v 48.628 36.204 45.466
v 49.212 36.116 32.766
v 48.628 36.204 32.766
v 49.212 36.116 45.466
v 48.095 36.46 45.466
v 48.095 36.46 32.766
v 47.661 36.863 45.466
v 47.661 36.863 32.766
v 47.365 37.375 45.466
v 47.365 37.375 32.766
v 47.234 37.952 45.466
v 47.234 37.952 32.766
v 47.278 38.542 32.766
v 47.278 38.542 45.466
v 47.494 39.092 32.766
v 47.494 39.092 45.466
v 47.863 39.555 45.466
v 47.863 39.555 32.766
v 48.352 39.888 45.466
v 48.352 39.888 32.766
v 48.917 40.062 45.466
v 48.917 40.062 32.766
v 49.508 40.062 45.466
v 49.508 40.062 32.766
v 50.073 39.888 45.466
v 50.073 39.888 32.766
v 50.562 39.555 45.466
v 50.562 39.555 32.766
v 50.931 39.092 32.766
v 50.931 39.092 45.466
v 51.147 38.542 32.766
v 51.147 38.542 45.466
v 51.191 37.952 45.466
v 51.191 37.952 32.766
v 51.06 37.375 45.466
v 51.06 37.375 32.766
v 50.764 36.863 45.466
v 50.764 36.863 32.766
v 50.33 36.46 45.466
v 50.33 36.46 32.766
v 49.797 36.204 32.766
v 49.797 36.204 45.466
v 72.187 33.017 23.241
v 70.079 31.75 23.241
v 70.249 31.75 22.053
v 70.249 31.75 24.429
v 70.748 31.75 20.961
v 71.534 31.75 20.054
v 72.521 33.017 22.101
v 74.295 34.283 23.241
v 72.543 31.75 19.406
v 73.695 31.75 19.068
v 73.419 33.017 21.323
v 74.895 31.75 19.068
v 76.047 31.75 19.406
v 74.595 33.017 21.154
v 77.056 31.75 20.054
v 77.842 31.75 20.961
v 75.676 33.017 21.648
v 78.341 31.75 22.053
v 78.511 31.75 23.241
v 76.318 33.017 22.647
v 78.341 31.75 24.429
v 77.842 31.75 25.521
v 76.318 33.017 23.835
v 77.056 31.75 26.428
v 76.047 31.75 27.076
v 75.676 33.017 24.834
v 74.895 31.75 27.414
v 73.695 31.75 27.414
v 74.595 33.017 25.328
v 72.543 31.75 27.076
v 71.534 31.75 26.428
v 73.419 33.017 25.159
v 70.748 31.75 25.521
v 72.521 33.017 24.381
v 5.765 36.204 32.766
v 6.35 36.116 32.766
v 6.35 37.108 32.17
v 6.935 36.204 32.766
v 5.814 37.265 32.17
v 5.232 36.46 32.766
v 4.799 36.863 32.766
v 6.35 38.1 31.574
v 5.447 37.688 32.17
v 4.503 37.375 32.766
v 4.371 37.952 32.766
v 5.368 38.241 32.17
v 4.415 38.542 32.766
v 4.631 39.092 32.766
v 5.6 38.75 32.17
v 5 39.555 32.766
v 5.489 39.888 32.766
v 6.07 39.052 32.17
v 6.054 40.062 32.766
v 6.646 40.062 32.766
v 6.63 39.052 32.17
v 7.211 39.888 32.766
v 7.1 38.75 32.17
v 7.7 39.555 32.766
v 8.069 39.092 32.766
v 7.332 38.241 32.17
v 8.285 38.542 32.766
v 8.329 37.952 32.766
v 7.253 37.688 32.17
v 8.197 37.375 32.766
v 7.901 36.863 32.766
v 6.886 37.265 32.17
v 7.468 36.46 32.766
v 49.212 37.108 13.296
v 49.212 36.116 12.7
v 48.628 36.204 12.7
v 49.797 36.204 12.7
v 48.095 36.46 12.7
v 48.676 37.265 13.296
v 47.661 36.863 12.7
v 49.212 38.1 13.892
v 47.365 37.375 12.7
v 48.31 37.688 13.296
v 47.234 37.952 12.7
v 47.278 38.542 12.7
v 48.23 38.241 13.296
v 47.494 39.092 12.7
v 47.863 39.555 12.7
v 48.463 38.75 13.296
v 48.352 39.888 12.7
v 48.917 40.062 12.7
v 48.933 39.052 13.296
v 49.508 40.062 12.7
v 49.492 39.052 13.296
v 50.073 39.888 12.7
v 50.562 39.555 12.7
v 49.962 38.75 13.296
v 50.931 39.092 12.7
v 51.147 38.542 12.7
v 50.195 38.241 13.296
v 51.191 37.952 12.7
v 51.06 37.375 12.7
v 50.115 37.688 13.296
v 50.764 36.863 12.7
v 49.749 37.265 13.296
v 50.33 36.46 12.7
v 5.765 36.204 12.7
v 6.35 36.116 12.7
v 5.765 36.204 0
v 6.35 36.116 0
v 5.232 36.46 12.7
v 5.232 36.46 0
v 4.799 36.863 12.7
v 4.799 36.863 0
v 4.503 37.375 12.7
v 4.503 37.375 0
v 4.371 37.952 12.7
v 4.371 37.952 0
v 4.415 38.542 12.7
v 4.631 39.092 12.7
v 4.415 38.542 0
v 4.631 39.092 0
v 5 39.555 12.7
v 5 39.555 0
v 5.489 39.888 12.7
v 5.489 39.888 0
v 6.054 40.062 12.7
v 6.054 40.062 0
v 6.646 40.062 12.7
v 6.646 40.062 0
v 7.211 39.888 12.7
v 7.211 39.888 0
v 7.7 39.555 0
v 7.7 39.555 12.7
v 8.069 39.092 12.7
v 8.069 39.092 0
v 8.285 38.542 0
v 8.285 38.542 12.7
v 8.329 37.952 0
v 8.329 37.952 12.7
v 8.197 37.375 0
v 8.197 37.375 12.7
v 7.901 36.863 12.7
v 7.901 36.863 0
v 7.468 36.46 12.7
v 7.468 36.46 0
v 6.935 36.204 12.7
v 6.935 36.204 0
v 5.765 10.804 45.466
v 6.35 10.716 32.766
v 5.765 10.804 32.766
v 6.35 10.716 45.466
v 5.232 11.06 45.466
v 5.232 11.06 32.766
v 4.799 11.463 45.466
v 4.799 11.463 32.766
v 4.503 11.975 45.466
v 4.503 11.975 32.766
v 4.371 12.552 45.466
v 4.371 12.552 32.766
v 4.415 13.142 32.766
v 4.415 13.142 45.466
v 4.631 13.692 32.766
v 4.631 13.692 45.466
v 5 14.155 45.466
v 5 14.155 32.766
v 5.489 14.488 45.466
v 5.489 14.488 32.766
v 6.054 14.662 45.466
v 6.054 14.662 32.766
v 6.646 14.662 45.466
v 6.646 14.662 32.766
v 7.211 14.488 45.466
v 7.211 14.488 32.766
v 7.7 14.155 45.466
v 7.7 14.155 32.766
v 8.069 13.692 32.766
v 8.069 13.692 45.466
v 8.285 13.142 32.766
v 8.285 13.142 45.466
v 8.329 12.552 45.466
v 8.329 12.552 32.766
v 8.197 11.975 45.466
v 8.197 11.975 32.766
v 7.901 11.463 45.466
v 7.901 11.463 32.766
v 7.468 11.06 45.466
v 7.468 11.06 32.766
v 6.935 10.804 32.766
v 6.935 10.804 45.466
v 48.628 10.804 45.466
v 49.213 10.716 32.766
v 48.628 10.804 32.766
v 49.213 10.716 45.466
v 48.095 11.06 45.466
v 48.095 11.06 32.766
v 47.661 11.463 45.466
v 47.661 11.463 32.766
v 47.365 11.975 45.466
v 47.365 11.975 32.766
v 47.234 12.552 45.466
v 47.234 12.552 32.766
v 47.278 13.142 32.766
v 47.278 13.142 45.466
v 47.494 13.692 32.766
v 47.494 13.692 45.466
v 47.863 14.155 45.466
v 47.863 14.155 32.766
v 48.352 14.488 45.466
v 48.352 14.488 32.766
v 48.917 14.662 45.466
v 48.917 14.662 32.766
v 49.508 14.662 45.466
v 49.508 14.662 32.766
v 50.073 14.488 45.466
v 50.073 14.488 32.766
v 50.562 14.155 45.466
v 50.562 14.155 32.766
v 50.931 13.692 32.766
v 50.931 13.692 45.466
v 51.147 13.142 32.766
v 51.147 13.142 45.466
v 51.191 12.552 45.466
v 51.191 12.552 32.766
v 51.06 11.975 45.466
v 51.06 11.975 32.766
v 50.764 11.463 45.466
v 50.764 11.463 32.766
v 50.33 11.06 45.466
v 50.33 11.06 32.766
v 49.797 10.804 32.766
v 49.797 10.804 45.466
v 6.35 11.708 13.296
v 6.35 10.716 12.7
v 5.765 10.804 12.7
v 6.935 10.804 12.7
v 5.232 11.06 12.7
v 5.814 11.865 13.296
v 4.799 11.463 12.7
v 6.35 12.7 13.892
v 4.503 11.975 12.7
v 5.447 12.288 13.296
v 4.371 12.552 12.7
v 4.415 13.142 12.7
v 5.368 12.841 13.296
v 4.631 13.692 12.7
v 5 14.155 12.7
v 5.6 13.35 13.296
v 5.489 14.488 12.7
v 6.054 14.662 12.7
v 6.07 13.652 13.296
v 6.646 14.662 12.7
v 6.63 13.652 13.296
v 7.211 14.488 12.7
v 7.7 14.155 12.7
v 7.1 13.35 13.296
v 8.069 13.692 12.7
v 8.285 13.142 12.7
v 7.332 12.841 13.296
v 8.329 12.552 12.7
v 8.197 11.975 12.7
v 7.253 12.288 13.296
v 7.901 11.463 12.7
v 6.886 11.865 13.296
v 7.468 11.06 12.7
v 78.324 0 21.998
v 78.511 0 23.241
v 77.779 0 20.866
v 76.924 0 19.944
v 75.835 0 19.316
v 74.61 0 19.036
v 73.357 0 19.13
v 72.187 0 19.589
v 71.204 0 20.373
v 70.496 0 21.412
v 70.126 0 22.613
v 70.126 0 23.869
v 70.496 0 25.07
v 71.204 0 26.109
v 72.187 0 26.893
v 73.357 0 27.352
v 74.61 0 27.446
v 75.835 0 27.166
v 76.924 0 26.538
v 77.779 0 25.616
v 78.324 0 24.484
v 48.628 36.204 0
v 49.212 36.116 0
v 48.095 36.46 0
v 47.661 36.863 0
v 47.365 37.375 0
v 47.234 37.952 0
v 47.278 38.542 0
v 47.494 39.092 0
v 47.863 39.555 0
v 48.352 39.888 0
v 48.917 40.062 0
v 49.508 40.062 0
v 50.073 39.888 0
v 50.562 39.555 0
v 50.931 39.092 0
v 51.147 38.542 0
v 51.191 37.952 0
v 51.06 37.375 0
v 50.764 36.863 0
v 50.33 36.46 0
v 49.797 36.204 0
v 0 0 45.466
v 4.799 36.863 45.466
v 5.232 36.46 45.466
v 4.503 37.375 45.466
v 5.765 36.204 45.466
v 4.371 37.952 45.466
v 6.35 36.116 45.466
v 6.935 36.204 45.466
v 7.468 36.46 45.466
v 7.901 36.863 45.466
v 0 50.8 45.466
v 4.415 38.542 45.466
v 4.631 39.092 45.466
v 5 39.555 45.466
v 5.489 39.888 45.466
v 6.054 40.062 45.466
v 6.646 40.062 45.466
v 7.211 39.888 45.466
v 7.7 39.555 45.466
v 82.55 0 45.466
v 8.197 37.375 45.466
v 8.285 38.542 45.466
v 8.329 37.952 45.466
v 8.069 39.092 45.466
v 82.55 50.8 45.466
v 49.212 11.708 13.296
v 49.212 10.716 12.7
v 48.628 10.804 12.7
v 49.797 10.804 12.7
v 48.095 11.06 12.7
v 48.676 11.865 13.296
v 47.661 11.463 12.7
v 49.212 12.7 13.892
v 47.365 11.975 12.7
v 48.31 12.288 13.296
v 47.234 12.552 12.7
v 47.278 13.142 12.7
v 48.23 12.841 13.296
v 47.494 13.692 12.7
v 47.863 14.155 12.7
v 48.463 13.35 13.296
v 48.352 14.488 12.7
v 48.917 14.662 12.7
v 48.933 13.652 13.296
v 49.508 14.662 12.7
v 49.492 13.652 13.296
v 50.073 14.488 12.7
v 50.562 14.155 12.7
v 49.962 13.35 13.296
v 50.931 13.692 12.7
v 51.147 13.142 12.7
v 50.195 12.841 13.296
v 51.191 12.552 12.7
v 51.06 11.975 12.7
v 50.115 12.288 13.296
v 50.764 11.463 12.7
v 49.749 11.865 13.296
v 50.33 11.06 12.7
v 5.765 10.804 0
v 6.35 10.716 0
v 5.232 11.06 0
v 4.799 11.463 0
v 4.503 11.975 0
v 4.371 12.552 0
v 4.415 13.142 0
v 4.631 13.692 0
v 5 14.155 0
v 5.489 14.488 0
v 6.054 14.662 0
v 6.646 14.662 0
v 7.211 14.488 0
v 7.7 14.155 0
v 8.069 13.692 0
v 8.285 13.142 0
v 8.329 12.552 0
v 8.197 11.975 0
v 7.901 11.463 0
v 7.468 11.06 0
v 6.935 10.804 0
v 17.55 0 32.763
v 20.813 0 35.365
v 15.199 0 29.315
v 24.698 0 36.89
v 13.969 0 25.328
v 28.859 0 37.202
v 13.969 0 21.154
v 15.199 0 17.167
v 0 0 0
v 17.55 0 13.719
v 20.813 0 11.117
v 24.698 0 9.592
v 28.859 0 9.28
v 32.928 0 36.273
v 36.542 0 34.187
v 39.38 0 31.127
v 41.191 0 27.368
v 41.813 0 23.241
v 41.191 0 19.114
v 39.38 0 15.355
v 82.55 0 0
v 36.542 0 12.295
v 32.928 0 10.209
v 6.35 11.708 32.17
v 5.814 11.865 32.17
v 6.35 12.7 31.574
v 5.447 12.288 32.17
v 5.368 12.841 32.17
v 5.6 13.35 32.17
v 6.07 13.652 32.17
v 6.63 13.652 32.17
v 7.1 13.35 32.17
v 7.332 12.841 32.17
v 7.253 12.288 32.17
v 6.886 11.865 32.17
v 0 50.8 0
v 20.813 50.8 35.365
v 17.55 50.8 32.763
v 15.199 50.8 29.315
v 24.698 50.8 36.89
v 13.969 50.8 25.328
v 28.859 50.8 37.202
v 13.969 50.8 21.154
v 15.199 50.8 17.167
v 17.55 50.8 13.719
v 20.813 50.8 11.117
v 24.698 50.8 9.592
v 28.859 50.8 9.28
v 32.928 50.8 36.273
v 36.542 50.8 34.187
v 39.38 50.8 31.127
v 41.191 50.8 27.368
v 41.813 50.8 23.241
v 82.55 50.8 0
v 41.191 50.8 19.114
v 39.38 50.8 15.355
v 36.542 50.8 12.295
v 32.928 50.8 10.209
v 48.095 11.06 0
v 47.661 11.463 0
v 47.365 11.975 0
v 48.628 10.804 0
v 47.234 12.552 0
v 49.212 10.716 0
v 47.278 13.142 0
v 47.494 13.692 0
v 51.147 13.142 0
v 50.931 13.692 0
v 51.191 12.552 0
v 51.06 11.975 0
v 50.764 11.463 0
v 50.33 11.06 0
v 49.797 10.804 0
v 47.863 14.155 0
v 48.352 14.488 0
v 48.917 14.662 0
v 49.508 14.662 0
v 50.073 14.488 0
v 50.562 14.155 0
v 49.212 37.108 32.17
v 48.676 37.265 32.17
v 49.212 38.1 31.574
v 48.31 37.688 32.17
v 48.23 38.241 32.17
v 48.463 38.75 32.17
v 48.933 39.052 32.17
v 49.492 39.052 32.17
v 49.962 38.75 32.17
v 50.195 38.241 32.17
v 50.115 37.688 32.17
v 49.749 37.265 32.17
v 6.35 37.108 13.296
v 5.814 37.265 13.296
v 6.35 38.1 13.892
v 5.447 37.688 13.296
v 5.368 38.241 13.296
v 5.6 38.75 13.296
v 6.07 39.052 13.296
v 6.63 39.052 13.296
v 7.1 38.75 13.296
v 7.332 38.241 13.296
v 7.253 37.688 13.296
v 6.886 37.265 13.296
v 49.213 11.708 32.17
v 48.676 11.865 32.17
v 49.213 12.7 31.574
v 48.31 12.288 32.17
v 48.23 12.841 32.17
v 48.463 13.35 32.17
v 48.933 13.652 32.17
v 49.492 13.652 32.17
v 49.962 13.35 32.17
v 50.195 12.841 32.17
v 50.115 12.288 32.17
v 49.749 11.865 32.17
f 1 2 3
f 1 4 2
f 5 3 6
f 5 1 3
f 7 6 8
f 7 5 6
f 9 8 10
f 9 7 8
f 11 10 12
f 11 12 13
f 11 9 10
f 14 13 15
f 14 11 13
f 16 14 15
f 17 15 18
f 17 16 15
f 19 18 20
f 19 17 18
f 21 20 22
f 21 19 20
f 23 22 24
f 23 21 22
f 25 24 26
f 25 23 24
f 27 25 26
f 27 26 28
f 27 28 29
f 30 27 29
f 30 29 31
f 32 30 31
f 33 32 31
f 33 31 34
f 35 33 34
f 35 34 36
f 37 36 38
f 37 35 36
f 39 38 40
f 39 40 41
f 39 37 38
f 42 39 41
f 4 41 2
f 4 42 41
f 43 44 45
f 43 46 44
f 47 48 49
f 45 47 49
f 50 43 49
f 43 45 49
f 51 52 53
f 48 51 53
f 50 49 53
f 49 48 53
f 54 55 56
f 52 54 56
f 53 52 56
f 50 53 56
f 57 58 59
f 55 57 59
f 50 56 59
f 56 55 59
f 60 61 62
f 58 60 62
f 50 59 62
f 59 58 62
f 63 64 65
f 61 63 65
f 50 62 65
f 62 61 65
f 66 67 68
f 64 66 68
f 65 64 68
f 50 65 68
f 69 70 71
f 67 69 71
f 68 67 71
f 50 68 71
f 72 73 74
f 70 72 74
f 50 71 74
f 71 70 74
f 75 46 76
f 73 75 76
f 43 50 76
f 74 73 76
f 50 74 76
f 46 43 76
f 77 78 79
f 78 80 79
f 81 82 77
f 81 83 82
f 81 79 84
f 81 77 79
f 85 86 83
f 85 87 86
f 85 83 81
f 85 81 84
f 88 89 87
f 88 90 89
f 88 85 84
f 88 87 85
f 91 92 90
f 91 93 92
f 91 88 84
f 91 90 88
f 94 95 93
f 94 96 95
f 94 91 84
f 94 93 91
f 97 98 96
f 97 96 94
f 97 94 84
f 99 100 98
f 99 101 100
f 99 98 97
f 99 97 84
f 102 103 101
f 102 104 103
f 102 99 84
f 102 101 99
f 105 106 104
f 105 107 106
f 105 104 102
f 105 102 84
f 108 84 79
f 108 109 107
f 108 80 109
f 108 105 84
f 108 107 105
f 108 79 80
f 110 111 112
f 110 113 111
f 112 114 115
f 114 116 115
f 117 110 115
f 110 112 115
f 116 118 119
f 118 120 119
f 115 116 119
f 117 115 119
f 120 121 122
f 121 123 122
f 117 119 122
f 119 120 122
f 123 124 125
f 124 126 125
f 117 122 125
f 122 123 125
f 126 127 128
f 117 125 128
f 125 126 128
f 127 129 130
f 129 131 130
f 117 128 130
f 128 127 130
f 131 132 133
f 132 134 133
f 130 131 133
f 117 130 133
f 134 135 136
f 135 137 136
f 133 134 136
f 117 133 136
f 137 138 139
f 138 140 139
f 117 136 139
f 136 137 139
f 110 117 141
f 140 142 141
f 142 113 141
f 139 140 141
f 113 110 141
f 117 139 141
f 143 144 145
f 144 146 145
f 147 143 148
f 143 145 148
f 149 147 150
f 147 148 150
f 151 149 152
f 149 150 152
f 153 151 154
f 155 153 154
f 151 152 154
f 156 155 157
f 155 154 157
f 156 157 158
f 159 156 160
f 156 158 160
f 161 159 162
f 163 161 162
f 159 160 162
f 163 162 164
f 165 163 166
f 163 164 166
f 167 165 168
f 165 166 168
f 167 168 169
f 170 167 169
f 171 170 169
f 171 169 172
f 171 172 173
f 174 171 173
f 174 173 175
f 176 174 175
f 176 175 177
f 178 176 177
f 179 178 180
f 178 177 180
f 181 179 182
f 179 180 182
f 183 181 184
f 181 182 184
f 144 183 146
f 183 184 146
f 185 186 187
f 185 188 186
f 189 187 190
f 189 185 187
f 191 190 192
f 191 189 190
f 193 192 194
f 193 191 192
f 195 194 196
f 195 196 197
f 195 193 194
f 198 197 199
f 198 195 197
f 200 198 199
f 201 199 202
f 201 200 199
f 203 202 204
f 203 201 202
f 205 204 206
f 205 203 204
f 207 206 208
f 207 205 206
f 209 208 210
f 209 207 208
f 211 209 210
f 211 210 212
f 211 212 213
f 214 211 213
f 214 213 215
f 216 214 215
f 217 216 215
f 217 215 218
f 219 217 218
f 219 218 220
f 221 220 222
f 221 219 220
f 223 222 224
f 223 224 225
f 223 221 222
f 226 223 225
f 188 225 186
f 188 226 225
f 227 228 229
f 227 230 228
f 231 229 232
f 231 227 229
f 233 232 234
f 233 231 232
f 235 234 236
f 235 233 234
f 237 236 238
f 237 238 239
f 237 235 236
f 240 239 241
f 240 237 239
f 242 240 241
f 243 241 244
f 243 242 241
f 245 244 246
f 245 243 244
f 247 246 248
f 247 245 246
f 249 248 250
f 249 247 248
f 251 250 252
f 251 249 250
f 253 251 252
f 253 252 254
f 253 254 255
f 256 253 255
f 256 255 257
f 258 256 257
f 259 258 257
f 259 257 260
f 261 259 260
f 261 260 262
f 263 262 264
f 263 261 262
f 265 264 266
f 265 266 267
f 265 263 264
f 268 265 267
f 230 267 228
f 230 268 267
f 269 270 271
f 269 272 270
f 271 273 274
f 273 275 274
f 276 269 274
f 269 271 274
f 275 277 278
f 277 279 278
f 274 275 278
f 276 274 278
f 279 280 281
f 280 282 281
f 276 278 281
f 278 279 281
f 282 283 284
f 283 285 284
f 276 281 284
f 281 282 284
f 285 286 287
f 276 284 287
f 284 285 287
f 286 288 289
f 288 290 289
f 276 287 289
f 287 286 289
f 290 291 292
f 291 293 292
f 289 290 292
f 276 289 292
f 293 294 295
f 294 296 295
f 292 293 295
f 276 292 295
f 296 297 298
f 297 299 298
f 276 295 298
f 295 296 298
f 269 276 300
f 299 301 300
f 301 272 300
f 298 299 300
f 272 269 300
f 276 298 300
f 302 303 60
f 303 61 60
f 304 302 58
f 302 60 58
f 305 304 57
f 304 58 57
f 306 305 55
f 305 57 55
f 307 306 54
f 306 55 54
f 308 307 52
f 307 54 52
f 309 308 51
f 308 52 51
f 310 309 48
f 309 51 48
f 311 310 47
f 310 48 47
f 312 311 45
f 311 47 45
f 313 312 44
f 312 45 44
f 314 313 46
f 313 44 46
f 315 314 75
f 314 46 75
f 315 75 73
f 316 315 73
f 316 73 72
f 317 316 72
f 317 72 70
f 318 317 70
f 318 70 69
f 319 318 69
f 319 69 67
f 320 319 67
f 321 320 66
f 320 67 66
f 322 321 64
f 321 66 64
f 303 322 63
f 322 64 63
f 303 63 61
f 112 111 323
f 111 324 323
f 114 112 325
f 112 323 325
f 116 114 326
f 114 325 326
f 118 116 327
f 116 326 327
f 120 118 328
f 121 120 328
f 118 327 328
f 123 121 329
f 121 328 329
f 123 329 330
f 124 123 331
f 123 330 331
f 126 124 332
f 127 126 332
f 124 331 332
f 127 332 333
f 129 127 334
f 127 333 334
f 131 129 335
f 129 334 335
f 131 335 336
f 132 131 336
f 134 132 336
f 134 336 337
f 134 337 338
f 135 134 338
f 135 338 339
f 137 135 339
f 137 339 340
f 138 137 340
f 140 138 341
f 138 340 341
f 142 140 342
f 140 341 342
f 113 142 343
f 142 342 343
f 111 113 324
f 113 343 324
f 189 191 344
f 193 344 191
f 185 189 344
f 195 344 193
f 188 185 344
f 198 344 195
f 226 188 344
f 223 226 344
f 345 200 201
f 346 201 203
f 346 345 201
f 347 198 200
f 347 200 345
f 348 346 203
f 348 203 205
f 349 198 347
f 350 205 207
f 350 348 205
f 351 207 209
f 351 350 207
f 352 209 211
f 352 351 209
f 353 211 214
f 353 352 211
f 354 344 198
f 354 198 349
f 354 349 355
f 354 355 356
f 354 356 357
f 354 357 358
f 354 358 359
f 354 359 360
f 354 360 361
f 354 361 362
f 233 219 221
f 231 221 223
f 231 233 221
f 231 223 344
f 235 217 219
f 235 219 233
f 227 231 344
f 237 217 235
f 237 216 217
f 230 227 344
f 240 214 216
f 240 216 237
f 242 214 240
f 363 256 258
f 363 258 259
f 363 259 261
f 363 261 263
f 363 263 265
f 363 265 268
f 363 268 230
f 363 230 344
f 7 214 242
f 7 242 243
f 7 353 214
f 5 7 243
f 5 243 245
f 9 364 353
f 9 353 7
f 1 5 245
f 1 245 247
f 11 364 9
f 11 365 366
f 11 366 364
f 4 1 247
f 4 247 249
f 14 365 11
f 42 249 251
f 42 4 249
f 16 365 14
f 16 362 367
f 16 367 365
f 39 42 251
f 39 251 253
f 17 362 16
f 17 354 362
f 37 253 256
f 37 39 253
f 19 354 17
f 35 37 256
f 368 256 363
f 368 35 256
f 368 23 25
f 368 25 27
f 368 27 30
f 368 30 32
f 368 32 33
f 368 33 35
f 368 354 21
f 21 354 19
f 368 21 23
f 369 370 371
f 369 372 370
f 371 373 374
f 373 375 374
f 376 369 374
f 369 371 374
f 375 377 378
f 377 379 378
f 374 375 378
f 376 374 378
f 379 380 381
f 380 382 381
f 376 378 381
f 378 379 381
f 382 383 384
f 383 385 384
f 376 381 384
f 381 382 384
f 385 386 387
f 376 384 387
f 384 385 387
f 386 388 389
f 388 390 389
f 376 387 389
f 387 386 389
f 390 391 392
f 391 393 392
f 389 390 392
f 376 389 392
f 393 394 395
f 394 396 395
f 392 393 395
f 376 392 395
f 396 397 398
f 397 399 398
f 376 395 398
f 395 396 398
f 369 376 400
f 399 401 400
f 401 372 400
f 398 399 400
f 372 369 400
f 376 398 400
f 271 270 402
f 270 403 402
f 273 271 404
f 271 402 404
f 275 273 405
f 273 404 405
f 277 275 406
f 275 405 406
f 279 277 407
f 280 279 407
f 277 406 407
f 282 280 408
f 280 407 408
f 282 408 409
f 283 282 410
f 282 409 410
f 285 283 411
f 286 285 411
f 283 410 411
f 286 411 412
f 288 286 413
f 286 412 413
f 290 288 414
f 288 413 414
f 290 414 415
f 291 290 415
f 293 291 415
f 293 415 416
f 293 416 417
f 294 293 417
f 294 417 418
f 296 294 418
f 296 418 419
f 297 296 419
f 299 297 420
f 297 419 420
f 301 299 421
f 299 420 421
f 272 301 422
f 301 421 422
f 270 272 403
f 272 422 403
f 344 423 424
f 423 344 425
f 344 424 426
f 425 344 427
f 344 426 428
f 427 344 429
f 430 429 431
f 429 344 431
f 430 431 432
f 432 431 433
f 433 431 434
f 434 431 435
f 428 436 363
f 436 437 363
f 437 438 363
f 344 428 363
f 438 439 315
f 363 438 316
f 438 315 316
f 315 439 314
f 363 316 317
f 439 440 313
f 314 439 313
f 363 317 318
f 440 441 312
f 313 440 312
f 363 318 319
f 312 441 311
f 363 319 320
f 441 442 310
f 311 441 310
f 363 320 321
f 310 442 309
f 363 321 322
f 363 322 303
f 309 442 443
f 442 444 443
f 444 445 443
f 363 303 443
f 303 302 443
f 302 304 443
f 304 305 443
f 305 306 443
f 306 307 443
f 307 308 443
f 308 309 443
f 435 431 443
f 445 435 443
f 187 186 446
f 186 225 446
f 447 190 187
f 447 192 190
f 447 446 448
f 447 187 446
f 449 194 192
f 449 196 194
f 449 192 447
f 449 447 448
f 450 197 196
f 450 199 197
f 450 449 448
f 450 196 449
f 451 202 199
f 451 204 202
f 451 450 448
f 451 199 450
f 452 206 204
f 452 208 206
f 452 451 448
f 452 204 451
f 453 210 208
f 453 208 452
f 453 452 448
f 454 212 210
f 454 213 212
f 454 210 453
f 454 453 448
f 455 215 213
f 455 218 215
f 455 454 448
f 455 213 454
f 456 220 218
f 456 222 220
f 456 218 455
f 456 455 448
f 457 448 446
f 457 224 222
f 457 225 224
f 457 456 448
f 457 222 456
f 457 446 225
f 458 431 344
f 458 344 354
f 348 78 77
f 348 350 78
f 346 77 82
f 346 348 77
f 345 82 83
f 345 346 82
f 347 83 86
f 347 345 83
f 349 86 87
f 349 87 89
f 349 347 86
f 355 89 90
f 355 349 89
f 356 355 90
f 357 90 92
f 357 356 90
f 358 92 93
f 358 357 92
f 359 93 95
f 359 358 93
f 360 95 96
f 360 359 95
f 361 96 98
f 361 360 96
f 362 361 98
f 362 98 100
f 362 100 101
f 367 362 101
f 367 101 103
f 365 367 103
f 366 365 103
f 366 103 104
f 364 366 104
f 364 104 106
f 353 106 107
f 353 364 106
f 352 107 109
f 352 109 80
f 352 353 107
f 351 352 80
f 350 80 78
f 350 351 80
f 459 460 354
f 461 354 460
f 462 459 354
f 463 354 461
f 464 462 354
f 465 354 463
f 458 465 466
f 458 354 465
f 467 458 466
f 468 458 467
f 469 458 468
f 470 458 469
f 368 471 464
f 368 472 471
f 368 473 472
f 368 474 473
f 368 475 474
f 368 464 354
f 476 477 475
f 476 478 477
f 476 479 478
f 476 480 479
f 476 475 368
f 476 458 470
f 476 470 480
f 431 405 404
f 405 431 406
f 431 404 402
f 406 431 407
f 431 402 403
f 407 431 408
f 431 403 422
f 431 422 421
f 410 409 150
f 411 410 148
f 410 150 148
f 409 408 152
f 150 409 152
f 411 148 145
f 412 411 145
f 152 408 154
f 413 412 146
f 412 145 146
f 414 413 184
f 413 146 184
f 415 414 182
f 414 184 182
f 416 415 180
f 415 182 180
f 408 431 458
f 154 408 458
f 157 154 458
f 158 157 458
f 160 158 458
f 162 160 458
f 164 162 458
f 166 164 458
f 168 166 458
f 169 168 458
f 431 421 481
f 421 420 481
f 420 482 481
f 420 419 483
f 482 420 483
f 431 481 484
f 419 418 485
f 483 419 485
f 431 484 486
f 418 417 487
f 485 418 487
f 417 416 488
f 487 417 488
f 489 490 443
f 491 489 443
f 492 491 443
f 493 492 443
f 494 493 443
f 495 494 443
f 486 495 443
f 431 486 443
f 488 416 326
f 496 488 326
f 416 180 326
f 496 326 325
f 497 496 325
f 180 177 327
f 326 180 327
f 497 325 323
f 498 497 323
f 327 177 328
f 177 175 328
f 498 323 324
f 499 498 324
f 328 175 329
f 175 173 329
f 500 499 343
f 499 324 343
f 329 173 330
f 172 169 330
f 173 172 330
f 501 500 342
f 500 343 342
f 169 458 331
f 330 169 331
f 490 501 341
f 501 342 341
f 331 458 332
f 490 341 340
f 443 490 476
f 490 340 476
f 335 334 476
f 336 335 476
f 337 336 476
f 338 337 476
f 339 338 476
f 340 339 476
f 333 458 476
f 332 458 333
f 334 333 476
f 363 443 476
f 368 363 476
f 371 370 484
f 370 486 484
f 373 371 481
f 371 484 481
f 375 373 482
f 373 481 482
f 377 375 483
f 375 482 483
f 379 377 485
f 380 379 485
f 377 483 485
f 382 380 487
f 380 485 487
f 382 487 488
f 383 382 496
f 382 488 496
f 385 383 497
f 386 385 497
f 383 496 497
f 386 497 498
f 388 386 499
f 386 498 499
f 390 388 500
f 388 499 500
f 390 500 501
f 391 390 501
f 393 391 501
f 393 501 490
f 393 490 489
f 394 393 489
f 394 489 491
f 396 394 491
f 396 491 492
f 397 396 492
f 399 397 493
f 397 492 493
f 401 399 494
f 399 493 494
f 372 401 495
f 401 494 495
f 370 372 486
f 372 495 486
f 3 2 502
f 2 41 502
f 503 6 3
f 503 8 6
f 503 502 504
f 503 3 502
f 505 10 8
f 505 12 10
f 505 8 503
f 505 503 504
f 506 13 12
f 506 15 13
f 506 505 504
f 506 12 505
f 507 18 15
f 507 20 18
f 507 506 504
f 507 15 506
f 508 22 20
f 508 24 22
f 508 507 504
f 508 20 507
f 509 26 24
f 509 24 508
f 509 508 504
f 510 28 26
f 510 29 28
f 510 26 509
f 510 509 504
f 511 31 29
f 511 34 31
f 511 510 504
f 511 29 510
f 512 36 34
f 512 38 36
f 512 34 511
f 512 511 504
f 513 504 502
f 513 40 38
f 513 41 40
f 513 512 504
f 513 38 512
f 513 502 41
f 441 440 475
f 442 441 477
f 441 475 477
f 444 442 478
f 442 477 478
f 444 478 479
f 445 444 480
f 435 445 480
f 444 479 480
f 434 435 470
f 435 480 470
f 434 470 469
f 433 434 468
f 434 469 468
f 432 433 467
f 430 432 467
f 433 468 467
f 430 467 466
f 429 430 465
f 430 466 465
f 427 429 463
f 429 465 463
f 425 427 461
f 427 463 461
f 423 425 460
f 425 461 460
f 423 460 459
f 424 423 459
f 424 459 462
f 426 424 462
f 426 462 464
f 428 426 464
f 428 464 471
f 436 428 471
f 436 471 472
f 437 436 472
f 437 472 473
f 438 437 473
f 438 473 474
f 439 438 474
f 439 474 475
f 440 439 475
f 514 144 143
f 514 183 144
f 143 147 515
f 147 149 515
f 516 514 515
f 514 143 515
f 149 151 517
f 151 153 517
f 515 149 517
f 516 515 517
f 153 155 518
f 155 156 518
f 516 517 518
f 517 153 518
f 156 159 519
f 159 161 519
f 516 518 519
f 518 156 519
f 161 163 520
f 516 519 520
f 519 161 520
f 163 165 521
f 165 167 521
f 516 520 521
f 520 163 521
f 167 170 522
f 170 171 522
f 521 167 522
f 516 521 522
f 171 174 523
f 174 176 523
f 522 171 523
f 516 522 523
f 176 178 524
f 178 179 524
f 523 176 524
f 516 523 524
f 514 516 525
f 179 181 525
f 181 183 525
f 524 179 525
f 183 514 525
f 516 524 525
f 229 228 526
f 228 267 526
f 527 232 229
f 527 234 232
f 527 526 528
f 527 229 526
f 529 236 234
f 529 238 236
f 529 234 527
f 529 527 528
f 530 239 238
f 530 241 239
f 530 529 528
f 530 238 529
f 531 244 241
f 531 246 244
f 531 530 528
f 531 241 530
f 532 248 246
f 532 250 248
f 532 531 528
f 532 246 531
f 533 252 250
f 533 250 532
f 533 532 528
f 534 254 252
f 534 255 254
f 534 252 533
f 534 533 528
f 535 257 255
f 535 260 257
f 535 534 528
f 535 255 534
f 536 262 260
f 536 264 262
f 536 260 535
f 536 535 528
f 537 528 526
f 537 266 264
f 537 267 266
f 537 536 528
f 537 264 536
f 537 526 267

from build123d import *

# Parameters (mm, degrees)
SKETCH1_W                                = 82.55
SKETCH1_H                                = 50.8
BOSS_EXTRUDE1_DEPTH                      = 45.466
SKETCH2_R                                = 14
CUT_EXTRUDE1_DEPTH                       = 51.8
F_5_32_0_15625_DIAMETER_HOLE1_AT_2_COUNT = 2
F_5_32_0_15625_DIAMETER_HOLE1_AT_2_PITCH = 42.8625
F_5_32_0_15625_DIAMETER_HOLE1_AT_3_COUNT = 2
F_5_32_0_15625_DIAMETER_HOLE1_AT_3_PITCH = 49.823226574
F_5_32_0_15625_DIAMETER_HOLE1_AT_4_COUNT = 2
F_5_32_0_15625_DIAMETER_HOLE1_AT_4_PITCH = 25.4
TAP_DRILL_FOR_3_8_24_TAP2_D              = 8.4328
TAP_DRILL_FOR_3_8_24_TAP2_DEPTH          = 31.75
TAP_DRILL_FOR_3_8_24_TAP2_TIP            = 2.533468714


with BuildPart() as part:
    # Sketch1 → Boss-Extrude1 (new body)
    with BuildSketch(Plane.XY):
        with Locations((41.275, 25.4)):
            Rectangle(SKETCH1_W, SKETCH1_H)
    extrude(amount=BOSS_EXTRUDE1_DEPTH)

    # Sketch2 → Cut-Extrude1 (cut, through all)
    with BuildSketch(Plane(origin=(0, 50.8, 0), x_dir=(1, 0, 0), z_dir=(0, 1, 0))):
        with Locations((27.813, -23.241)):
            Circle(SKETCH2_R)
    extrude(amount=-CUT_EXTRUDE1_DEPTH, mode=Mode.SUBTRACT)

    # Sketch6 → 5/32 (0.15625) Diameter Hole1 (revolve, cut)
    with BuildSketch(Plane(origin=(6.35, 38.1, 45.466), x_dir=(0, -1, 0), z_dir=(1, 0, 0))):
        Polygon((0, 0), (0, 13.892332791), (1.984375, 12.7), (1.984375, 0), align=None)
    f_5_32_0_15625_diameter_hole1 = revolve(axis=Axis((6.35, 38.1, 51.816), (0, 0, -1)), mode=Mode.SUBTRACT)

    # 5/32 (0.15625) Diameter Hole1 at 2: 5/32 (0.15625) Diameter Hole1 ×2
    with Locations(*[(i * F_5_32_0_15625_DIAMETER_HOLE1_AT_2_PITCH, 0, 0) for i in range(1, F_5_32_0_15625_DIAMETER_HOLE1_AT_2_COUNT)]):
        add(f_5_32_0_15625_diameter_hole1, mode=Mode.SUBTRACT)

    # 5/32 (0.15625) Diameter Hole1 at 3: 5/32 (0.15625) Diameter Hole1 ×2
    with Locations(*[Vector(0.860291534, -0.50980239, 0) * (i * F_5_32_0_15625_DIAMETER_HOLE1_AT_3_PITCH) for i in range(1, F_5_32_0_15625_DIAMETER_HOLE1_AT_3_COUNT)]):
        add(f_5_32_0_15625_diameter_hole1, mode=Mode.SUBTRACT)

    # 5/32 (0.15625) Diameter Hole1 at 4: 5/32 (0.15625) Diameter Hole1 ×2
    with Locations(*[(0, -i * F_5_32_0_15625_DIAMETER_HOLE1_AT_4_PITCH, 0) for i in range(1, F_5_32_0_15625_DIAMETER_HOLE1_AT_4_COUNT)]):
        add(f_5_32_0_15625_diameter_hole1, mode=Mode.SUBTRACT)

    # Mirror1: 5/32 (0.15625) Diameter Hole1 across plane
    add(f_5_32_0_15625_diameter_hole1.mirror(Plane.XY.offset(22.733)), mode=Mode.SUBTRACT)

    # Mirror1 copy 1 sketch → Mirror1 copy 1 (revolve, cut)
    with BuildSketch(Plane(origin=(49.2125, 38.1, 0), x_dir=(0, -1, 0), z_dir=(1, 0, 0))):
        Polygon((0, 0), (0, -13.892332791), (1.984375, -12.7), (1.984375, 0), align=None)
    revolve(axis=Axis((49.2125, 38.1, -6.35), (0, 0, -1)), mode=Mode.SUBTRACT)

    # Mirror1 copy 2 sketch → Mirror1 copy 2 (revolve, cut)
    with BuildSketch(Plane(origin=(49.2125, 12.7, 0), x_dir=(0, -1, 0), z_dir=(1, 0, 0))):
        Polygon((0, 0), (0, -13.892332791), (1.984375, -12.7), (1.984375, 0), align=None)
    revolve(axis=Axis((49.2125, 12.7, -6.35), (0, 0, -1)), mode=Mode.SUBTRACT)

    # Mirror1 copy 3 sketch → Mirror1 copy 3 (revolve, cut)
    with BuildSketch(Plane(origin=(6.35, 12.7, 0), x_dir=(0, -1, 0), z_dir=(1, 0, 0))):
        Polygon((0, 0), (0, -13.892332791), (1.984375, -12.7), (1.984375, 0), align=None)
    revolve(axis=Axis((6.35, 12.7, -6.35), (0, 0, -1)), mode=Mode.SUBTRACT)

    # Tap Drill for 3/8-24 Tap2
    with Locations(Plane(origin=(0, 0, 0), x_dir=(-1, 0, 0), z_dir=(0, -1, 0))):
        with Locations((-74.295, -23.241)):
            Hole(TAP_DRILL_FOR_3_8_24_TAP2_D / 2, depth=TAP_DRILL_FOR_3_8_24_TAP2_DEPTH)
            with Locations((0, 0, -(TAP_DRILL_FOR_3_8_24_TAP2_DEPTH + TAP_DRILL_FOR_3_8_24_TAP2_TIP / 2))):  # 118° drill point
                Cone(0, TAP_DRILL_FOR_3_8_24_TAP2_D / 2, TAP_DRILL_FOR_3_8_24_TAP2_TIP, mode=Mode.SUBTRACT)


solid = part.part
